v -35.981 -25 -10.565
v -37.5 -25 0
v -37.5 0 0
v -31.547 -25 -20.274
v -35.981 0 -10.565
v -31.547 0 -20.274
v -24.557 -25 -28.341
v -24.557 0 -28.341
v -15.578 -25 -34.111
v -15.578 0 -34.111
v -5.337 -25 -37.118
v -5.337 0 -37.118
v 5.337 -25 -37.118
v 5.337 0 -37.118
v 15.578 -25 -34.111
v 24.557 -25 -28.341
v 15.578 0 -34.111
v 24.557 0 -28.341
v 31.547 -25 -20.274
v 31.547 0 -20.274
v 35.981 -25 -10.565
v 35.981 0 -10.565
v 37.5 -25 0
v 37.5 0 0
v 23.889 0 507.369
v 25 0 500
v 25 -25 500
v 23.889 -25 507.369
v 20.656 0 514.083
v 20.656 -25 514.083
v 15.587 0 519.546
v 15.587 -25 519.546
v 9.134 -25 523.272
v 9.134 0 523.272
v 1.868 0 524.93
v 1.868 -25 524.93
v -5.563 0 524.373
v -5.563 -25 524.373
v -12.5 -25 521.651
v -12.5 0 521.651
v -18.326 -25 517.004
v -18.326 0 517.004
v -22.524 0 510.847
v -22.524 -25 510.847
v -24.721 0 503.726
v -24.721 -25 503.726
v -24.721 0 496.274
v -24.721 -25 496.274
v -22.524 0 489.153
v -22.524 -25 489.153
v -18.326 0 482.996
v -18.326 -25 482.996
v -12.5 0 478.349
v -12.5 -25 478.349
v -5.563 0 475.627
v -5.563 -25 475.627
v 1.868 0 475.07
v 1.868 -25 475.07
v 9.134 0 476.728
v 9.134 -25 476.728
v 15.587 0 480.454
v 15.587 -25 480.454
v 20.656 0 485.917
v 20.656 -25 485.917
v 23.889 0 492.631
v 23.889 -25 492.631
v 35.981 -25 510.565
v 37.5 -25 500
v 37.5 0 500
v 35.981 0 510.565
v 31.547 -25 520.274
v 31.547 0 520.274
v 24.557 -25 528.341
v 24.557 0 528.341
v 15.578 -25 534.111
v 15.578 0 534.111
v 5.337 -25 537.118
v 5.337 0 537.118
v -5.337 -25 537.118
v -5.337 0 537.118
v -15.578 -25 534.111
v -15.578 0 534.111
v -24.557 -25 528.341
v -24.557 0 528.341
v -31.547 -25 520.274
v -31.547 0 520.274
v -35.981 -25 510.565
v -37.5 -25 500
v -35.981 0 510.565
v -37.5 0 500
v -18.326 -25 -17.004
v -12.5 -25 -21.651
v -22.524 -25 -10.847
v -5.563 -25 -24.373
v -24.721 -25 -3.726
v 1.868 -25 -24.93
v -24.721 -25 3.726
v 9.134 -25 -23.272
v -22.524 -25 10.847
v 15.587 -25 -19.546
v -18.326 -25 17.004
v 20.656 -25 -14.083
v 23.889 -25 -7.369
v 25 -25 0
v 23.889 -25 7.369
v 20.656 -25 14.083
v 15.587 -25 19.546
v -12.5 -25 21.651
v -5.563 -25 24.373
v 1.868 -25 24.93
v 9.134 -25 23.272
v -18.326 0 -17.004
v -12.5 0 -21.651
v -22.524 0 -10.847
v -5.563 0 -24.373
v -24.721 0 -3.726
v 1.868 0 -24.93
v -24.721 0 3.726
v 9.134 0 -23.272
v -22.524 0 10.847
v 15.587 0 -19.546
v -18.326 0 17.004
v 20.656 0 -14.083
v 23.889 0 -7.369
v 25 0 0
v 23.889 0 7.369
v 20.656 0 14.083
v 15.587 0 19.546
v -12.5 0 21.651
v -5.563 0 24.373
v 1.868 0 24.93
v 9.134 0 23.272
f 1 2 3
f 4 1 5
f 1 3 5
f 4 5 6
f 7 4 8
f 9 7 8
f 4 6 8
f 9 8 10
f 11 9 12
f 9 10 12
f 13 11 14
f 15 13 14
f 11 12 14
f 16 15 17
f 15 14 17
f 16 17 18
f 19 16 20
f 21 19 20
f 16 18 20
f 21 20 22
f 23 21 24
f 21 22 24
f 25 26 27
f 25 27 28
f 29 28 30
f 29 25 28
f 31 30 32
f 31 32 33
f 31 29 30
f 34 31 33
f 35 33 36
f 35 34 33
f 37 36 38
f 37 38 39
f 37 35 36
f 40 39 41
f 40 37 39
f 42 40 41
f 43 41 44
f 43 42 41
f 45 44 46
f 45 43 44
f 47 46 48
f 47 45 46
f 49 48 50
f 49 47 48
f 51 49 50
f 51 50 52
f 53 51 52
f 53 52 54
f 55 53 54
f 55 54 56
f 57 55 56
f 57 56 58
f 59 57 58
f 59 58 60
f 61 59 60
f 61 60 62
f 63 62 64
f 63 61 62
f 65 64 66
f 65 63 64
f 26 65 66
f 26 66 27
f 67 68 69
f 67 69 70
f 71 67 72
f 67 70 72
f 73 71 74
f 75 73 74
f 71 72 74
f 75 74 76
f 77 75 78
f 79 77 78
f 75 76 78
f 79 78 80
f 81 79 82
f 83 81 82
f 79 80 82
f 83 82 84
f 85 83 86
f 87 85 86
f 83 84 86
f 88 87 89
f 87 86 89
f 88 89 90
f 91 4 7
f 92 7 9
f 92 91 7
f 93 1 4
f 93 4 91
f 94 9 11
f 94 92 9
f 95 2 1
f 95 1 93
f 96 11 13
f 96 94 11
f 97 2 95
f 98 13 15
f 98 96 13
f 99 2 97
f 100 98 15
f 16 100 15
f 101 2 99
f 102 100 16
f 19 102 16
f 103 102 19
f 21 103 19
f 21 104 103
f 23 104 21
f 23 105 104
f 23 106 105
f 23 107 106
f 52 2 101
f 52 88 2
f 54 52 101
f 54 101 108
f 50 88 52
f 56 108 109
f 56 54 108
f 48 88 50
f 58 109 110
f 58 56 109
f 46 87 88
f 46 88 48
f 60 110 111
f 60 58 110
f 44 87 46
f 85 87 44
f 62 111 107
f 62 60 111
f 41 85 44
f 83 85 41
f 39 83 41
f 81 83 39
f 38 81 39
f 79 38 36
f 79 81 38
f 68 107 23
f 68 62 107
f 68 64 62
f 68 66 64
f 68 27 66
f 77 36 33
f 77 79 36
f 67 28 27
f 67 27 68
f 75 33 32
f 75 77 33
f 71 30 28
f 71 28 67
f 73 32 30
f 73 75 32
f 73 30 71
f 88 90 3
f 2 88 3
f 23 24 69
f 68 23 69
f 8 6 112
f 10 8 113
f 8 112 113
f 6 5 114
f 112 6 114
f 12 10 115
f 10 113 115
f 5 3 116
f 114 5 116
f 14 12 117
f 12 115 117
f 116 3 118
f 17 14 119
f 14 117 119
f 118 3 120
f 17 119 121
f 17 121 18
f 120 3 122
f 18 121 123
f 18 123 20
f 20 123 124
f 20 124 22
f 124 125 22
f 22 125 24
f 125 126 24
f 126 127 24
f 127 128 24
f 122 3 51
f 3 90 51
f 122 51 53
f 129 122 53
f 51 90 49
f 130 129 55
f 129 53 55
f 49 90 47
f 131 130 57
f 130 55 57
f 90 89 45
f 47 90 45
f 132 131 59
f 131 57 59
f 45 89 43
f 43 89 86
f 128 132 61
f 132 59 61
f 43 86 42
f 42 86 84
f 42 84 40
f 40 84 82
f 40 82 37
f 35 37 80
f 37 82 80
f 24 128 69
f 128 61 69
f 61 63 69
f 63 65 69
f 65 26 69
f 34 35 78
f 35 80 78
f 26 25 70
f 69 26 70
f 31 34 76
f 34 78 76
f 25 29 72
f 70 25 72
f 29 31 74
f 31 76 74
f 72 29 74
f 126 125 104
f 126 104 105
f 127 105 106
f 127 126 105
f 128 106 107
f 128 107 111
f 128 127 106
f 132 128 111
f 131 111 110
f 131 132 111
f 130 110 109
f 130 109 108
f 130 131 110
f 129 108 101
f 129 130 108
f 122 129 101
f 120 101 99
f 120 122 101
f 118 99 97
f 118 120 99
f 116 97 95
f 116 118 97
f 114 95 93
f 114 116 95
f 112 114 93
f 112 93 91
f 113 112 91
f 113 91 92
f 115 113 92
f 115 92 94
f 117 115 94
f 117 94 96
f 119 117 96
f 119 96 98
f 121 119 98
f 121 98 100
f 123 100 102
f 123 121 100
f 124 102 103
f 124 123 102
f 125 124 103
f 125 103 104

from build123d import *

# Parameters (mm, degrees)
F0_R     = 25
F1_DEPTH = 25


with BuildPart() as f1:
    # F0 (on Front) → F1 (new body)
    with BuildSketch(Plane.XZ):
        with BuildLine():
            ThreePointArc((-37.5, 0), (0, -37.5), (37.5, 0))
            ThreePointArc((37.5, 0), (0, 37.5), (-37.5, 0))
        make_face()
        Circle(F0_R, mode=Mode.SUBTRACT)
        with BuildLine():
            ThreePointArc((-37.5, 500), (0, 462.5), (37.5, 500))
            ThreePointArc((37.5, 500), (0, 537.5), (-37.5, 500))
        make_face()
        with Locations((0, 500)):
            Circle(F0_R, mode=Mode.SUBTRACT)
        with BuildLine():
            ThreePointArc((-37.5, 0), (0, 37.5), (37.5, 0))
            Line((37.5, 0), (37.5, 500))
            ThreePointArc((37.5, 500), (0, 462.5), (-37.5, 500))
            Line((-37.5, 500), (-37.5, 0))
        make_face()
    extrude(amount=F1_DEPTH)


solid = f1.part
